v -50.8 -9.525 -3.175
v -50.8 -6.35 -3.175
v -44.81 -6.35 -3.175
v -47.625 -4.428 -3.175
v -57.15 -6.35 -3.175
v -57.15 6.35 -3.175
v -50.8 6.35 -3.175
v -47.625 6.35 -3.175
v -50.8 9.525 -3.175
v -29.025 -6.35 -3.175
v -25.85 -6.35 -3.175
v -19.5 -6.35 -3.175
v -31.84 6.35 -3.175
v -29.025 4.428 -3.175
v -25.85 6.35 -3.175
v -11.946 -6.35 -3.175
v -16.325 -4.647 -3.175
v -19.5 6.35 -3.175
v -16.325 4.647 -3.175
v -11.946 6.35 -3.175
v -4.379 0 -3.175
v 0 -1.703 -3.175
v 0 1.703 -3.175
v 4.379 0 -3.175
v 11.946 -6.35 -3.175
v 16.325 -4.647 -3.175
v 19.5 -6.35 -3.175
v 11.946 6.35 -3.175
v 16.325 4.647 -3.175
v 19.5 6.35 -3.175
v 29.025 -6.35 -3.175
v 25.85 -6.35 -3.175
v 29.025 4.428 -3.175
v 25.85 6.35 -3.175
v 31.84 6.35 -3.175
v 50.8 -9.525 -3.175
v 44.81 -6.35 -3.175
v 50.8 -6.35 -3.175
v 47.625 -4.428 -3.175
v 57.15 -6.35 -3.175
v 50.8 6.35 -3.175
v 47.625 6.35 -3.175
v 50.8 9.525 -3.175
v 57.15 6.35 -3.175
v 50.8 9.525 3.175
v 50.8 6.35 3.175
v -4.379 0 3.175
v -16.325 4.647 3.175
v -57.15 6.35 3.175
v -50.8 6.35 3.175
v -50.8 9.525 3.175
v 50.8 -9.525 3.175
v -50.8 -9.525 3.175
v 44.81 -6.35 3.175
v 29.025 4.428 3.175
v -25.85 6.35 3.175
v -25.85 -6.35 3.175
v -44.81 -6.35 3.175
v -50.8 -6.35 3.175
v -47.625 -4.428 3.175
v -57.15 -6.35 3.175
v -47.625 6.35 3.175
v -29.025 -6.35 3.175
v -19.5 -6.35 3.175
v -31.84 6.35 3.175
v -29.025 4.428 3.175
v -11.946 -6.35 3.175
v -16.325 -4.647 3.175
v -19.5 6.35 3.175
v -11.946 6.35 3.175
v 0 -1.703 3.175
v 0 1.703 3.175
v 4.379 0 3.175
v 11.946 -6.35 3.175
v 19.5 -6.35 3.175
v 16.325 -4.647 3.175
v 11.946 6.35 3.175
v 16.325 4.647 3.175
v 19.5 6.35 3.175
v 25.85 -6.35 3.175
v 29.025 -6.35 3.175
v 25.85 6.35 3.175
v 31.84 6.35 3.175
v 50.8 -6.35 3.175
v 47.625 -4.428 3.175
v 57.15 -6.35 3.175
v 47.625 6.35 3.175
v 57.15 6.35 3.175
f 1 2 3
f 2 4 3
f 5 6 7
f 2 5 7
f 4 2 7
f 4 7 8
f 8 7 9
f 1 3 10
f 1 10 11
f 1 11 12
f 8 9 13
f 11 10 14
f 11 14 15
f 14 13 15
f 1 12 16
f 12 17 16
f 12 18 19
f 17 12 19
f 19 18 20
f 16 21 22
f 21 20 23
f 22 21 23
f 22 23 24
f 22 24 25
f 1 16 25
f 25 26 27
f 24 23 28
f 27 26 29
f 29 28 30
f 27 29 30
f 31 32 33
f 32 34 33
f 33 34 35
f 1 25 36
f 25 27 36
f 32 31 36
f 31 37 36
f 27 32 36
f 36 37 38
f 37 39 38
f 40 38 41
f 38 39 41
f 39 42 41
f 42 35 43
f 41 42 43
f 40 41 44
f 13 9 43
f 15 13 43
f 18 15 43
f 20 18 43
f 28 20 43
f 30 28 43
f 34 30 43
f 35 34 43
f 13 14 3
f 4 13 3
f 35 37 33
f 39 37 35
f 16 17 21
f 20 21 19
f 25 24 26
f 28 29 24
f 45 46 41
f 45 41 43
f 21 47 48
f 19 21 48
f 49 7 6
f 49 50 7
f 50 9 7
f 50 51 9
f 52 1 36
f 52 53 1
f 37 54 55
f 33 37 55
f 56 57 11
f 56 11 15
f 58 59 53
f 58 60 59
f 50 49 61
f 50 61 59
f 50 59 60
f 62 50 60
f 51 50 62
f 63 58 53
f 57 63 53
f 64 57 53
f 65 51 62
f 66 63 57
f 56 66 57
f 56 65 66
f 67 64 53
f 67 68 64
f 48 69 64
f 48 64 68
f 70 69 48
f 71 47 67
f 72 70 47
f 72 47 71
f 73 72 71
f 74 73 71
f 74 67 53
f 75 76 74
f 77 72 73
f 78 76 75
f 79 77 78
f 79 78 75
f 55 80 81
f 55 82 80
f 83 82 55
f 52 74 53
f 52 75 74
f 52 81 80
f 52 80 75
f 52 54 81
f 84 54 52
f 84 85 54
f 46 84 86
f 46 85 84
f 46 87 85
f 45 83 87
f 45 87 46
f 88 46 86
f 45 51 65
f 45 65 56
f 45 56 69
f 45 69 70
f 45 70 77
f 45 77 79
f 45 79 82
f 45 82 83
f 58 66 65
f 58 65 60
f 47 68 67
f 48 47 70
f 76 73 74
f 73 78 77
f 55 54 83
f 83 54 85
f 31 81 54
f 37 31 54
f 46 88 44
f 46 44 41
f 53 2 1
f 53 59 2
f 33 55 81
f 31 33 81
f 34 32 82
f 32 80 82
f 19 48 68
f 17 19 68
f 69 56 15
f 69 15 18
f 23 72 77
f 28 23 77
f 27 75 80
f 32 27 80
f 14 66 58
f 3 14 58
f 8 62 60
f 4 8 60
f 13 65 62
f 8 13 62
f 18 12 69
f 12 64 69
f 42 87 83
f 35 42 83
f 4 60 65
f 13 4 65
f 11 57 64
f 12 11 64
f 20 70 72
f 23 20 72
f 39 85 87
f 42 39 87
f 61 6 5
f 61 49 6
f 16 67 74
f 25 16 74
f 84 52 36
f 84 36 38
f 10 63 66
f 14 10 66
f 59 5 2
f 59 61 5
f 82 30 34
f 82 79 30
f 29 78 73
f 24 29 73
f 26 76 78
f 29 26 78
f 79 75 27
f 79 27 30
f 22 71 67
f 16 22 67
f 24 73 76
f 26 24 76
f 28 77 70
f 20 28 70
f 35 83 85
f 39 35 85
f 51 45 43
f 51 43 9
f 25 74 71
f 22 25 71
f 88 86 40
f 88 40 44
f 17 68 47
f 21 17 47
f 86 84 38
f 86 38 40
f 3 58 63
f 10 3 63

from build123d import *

# Parameters (mm, degrees)
SKETCH1_W           = 6.35
SKETCH1_H           = 12.7
BOSS_EXTRUDE1_DEPTH = 3.175
CUT_EXTRUDE1_DEPTH  = 7.35


with BuildPart() as part:
    # Sketch1 → Boss-Extrude1 (new body, symmetric)
    with BuildSketch(Plane.XY):
        Polygon((-50.8, -9.525), (50.8, -9.525), (50.8, -6.35), (57.15, -6.35), (57.15, 6.35), (50.8, 6.35), (50.8, 9.525), (-50.8, 9.525), (-50.8, 6.35), (-57.15, 6.35), (-57.15, -6.35), (-50.8, -6.35), align=None)
        with Locations((-22.675, 0)):
            Rectangle(SKETCH1_W, SKETCH1_H, mode=Mode.SUBTRACT)
        with Locations((22.675, 0)):
            Rectangle(SKETCH1_W, SKETCH1_H, mode=Mode.SUBTRACT)
    extrude(amount=BOSS_EXTRUDE1_DEPTH, both=True)

    # Sketch2 → Cut-Extrude1 (cut, through all)
    with BuildSketch(Plane.XY.offset(3.175)):
        Polygon((-31.840276407, 6.35), (-47.625, 6.35), (-47.625, -4.427741378), align=None)
        Polygon((-29.025, 4.427741378), (-44.809723593, -6.35), (-29.025, -6.35), align=None)
        Polygon((-16.325, -4.646633401), (-4.379127517, 0), (-16.325, 4.646633401), align=None)
        Polygon((-11.945872483, 6.35), (0, 1.703366599), (11.945872483, 6.35), align=None)
        Polygon((4.379127517, 0), (16.325, -4.646633401), (16.325, 4.646633401), align=None)
        Polygon((-11.945872483, -6.35), (11.945872483, -6.35), (0, -1.703366599), align=None)
        Polygon((44.809723593, -6.35), (29.025, 4.427741378), (29.025, -6.35), align=None)
        Polygon((47.625, 6.35), (31.840276407, 6.35), (47.625, -4.427741378), align=None)
    extrude(amount=-CUT_EXTRUDE1_DEPTH, mode=Mode.SUBTRACT)


solid = part.part
